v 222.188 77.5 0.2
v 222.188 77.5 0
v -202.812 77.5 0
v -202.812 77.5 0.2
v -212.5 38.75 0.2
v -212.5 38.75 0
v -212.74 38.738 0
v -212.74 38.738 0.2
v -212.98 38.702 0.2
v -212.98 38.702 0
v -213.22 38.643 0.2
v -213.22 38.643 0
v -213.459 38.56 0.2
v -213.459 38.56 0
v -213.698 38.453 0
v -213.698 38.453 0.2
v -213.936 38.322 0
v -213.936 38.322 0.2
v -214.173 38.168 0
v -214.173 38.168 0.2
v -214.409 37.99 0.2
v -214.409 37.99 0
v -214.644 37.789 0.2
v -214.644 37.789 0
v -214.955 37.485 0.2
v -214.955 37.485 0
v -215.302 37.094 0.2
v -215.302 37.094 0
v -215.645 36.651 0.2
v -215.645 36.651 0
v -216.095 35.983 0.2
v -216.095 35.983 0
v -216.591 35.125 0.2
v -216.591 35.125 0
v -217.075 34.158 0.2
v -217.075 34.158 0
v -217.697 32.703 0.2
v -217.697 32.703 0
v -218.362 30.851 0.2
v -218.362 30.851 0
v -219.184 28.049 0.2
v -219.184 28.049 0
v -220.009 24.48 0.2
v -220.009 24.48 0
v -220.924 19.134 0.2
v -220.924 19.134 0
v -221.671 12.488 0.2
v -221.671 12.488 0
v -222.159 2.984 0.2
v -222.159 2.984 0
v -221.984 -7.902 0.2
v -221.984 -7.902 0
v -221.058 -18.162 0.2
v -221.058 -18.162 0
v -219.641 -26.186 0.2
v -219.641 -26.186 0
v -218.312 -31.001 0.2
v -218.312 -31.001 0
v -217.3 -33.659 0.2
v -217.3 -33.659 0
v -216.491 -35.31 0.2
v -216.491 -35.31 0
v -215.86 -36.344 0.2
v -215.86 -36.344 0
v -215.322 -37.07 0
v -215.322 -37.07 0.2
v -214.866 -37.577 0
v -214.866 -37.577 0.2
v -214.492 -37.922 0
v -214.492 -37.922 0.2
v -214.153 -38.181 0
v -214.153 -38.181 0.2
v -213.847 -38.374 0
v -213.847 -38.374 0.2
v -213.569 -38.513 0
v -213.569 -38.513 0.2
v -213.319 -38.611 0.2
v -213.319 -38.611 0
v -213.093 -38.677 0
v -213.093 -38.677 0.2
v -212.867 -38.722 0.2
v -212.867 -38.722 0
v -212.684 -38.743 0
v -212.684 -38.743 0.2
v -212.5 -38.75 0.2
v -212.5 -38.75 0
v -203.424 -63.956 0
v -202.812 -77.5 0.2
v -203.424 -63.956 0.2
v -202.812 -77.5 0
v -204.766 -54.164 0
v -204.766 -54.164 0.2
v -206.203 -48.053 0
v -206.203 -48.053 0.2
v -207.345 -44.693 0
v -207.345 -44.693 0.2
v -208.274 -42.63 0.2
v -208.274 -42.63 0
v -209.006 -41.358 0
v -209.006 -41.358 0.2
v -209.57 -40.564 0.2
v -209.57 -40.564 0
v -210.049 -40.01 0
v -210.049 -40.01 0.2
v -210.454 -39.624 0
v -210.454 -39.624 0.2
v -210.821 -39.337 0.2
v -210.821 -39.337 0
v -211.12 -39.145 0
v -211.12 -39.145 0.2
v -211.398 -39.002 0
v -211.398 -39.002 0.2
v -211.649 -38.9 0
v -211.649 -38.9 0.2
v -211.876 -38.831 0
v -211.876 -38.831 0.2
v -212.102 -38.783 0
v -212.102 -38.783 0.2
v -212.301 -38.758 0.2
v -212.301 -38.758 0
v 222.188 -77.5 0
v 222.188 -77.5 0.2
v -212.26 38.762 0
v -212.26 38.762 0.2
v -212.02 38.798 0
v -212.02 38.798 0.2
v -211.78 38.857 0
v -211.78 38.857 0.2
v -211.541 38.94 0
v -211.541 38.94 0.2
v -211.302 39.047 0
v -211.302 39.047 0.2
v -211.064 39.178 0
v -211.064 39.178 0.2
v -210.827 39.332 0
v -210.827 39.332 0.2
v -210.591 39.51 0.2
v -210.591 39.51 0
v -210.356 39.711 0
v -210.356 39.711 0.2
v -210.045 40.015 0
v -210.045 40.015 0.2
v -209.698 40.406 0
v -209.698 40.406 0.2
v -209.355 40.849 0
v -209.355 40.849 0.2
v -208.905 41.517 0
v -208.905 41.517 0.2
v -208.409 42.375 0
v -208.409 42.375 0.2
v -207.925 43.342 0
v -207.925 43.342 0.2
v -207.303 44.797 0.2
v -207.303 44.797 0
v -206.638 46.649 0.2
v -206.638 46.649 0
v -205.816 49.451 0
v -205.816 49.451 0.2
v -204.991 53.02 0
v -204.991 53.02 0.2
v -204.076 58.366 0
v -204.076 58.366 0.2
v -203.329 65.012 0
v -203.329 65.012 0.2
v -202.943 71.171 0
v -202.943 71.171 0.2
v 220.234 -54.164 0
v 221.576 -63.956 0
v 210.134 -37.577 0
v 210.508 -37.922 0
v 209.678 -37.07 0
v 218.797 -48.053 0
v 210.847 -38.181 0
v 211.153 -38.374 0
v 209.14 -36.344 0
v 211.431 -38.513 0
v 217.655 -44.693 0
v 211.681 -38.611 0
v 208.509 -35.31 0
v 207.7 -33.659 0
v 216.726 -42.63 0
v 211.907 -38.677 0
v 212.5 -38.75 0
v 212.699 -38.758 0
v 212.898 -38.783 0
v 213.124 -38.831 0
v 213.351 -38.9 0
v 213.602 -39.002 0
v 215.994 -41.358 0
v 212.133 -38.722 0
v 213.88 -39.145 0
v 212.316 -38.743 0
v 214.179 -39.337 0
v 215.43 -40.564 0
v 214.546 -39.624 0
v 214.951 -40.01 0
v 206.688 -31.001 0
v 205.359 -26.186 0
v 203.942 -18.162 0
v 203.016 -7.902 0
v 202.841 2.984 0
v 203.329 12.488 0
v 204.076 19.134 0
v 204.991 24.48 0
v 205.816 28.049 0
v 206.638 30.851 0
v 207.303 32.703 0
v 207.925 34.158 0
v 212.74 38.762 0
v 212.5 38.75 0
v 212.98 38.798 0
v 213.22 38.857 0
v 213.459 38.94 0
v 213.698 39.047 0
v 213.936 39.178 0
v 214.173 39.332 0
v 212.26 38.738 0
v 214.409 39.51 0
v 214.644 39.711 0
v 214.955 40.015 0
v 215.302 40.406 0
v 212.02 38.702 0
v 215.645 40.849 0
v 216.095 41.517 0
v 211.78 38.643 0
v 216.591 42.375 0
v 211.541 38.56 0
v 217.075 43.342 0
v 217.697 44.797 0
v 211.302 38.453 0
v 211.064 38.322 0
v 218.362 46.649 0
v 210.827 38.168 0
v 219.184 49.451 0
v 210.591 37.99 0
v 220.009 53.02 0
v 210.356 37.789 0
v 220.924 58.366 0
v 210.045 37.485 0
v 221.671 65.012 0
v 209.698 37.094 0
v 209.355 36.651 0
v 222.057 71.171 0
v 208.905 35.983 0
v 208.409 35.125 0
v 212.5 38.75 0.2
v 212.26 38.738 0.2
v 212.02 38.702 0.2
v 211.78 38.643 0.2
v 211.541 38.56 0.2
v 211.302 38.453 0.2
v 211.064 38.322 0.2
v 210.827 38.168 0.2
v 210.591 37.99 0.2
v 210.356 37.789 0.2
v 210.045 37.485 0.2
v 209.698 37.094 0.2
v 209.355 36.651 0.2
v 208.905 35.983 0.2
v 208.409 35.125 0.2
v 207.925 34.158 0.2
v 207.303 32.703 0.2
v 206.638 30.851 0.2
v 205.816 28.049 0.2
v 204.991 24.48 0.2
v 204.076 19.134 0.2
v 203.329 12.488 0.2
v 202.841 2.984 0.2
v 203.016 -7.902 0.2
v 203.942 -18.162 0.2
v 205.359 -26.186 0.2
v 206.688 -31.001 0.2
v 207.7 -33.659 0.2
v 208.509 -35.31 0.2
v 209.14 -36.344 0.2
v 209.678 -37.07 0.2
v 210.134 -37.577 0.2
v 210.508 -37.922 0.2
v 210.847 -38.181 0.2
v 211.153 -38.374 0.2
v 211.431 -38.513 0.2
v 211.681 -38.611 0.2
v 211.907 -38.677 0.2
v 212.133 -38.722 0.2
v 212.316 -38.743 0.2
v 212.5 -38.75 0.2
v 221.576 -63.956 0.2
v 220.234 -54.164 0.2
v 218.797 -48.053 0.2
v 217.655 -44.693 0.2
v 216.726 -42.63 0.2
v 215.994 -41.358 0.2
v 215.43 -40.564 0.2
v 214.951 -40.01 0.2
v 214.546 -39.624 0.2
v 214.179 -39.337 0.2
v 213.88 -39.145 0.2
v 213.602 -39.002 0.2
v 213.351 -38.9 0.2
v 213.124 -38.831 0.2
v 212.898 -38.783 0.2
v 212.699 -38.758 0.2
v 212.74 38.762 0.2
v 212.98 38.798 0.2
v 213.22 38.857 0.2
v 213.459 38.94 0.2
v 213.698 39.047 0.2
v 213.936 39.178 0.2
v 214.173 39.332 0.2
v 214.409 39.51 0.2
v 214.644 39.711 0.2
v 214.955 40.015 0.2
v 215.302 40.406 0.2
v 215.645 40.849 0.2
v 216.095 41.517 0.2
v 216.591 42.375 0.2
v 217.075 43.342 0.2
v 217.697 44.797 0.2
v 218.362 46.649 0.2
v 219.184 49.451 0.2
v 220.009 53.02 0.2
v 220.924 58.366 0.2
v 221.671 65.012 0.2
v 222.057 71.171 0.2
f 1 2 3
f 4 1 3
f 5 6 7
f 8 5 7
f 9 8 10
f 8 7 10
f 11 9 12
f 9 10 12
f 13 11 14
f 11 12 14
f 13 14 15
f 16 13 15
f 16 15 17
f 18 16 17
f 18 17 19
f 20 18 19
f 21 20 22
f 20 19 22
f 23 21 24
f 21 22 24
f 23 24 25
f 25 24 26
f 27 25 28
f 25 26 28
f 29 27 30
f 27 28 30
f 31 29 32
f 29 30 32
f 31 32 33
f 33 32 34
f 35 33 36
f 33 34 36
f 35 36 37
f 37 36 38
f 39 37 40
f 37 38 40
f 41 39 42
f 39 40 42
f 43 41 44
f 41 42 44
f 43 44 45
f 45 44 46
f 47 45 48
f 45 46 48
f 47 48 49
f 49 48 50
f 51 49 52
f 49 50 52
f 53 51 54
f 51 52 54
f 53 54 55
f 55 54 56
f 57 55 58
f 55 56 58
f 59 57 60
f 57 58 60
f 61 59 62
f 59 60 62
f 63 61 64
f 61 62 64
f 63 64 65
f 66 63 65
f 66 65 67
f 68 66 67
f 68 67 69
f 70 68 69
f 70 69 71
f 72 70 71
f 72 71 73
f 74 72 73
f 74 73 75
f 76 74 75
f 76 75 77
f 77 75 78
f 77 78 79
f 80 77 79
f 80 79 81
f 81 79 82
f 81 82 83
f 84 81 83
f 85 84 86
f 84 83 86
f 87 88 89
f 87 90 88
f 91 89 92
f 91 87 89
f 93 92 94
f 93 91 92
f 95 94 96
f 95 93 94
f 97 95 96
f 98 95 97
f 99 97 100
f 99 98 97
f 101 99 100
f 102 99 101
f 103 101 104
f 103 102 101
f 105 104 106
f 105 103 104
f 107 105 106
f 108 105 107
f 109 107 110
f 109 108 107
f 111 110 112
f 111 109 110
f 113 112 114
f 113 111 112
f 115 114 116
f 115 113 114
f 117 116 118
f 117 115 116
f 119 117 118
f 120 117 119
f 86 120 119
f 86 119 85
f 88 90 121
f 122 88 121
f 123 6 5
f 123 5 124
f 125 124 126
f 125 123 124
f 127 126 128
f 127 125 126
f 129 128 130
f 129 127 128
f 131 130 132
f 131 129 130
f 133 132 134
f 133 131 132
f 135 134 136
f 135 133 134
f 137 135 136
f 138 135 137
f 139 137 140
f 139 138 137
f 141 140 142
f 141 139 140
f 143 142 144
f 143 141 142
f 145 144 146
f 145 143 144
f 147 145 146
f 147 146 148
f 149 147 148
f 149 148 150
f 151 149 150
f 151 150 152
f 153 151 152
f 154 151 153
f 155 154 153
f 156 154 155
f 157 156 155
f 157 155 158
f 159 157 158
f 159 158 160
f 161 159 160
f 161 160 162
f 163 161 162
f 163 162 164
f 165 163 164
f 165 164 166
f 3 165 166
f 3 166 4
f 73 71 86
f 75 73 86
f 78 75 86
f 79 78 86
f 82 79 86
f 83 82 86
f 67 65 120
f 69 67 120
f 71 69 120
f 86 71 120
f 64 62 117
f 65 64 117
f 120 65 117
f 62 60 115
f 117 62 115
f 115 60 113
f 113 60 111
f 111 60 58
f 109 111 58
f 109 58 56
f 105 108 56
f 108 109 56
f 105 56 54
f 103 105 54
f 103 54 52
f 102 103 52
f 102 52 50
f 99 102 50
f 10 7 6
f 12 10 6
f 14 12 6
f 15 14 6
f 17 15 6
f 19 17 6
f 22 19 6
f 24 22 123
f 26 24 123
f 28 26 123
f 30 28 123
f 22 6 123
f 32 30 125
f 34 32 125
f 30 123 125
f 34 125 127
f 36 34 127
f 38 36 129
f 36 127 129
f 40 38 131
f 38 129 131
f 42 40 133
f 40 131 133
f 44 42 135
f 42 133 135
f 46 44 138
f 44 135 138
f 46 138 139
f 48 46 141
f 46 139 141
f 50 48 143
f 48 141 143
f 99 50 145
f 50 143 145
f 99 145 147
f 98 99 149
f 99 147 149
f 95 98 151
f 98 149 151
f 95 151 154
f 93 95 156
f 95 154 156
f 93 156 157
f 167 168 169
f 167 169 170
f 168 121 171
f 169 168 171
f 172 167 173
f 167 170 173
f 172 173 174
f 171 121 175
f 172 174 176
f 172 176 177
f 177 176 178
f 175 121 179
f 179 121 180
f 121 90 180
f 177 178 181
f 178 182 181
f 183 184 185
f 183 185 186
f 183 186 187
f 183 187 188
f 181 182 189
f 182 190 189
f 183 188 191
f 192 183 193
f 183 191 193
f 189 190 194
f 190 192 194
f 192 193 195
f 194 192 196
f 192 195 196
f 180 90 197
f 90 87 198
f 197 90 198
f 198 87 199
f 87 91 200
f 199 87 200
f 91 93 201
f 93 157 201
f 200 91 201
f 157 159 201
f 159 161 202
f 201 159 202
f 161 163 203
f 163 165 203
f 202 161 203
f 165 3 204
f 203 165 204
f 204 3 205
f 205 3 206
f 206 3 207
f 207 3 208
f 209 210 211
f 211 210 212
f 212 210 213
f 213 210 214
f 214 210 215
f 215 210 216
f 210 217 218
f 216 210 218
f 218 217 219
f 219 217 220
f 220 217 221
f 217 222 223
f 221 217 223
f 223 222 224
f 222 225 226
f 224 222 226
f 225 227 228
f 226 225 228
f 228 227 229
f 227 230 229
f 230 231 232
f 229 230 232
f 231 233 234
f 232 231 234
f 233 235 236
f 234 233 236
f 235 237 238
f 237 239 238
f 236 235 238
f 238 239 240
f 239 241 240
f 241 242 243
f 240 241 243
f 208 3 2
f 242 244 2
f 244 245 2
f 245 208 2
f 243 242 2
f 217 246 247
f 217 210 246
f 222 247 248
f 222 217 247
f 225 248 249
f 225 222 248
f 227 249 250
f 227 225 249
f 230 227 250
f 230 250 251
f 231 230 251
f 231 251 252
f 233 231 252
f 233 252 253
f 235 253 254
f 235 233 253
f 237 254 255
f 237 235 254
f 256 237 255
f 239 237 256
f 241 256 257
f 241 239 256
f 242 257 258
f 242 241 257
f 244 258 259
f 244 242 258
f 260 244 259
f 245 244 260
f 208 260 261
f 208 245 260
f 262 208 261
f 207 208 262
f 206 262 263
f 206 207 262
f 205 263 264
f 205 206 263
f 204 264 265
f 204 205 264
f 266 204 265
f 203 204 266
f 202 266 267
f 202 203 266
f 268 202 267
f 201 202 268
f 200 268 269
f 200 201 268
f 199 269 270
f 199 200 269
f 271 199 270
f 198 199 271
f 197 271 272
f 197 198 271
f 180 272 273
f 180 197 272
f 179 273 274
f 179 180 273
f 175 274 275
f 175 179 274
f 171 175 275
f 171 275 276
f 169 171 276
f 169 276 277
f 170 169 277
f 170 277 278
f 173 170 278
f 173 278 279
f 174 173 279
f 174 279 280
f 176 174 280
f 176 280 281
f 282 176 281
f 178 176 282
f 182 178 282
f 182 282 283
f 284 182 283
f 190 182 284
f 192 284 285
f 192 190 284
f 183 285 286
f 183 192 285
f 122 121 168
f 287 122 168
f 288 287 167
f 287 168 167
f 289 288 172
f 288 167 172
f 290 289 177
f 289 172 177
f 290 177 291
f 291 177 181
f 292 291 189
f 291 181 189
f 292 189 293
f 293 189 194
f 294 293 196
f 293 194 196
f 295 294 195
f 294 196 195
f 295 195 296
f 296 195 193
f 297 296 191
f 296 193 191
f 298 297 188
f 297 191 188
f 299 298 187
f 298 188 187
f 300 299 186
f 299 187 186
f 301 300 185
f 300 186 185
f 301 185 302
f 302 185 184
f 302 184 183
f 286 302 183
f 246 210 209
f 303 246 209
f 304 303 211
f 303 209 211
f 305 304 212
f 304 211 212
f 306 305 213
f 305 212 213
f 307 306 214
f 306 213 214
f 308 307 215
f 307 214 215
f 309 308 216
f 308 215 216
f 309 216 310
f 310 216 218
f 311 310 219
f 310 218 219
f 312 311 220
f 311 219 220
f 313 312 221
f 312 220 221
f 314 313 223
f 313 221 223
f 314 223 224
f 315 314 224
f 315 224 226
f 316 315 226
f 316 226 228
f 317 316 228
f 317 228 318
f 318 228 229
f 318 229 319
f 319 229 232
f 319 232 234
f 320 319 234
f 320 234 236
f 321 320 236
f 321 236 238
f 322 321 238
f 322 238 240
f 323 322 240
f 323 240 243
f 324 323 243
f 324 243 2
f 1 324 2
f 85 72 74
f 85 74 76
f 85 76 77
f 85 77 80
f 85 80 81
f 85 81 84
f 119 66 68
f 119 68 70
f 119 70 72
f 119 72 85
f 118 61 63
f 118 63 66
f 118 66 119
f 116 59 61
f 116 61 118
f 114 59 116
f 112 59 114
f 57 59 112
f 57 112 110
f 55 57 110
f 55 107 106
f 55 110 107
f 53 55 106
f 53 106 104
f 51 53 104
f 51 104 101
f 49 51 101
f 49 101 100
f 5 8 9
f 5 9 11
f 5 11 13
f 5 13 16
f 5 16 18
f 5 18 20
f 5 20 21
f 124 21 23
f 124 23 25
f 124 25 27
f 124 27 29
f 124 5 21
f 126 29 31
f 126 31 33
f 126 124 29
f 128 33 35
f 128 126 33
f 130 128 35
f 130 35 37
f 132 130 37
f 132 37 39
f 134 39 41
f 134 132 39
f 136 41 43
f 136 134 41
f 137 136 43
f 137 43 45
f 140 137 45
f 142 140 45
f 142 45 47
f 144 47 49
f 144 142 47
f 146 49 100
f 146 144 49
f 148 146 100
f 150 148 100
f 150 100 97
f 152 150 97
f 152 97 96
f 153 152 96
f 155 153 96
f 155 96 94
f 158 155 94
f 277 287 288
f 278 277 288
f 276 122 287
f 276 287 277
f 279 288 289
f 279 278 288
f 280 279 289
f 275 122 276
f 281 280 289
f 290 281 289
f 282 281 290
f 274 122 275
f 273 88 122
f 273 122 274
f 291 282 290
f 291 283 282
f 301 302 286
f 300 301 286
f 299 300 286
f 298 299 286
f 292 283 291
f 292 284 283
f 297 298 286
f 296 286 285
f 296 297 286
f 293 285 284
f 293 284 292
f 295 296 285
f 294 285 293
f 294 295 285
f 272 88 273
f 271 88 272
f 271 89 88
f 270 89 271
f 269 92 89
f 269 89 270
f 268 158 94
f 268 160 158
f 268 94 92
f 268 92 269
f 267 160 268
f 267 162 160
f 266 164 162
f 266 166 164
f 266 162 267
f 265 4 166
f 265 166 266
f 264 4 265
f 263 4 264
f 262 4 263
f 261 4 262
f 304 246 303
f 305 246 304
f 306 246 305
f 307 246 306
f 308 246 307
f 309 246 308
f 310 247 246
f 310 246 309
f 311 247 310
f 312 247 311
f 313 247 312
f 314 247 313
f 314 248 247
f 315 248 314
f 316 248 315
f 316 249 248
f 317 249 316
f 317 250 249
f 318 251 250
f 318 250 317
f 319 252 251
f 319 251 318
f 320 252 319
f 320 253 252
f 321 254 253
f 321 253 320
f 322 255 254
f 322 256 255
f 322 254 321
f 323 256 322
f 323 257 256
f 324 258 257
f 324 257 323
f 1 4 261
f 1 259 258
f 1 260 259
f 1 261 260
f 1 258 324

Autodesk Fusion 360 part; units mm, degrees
sketch "Sketch1" plane through (0, 0, 0) normal (0, 0, 1) x (1, 0, 0)
  line L0 (212.5, 77.5) -> (-212.5, 77.5)
  line L1 (-212.5, 77.5) -> (-212.5, -77.5)
  line L2 (-212.5, -77.5) -> (212.5, -77.5)
  line L3 (212.5, -77.5) -> (212.5, 77.5)
  line L4 (212.5, 77.5) -> (-212.5, -77.5) construction
  line L5 (-212.5, 77.5) -> (212.5, -77.5) construction
  ellipse E0 centre (-212.5, 77.5) end of major axis (-212.5, 116.25) minor radius 9.6875
  line L6 (-212.5, 38.75) -> (-212.5, 116.25)
  line L7 (-202.8125, 77.5) -> (-222.1875, 77.5)
  ellipse E1 centre (212.5, 77.5) end of major axis (212.5, 116.25) minor radius 9.6875
  ellipse E2 centre (-212.5, 0) end of major axis (-212.5, 38.75) minor radius 9.6875
  ellipse E3 centre (212.5, 0) end of major axis (212.5, 38.75) minor radius 9.6875
  ellipse E4 centre (-212.5, -77.5) end of major axis (-212.5, -38.75) minor radius 9.6875
  ellipse E5 centre (212.5, -77.5) end of major axis (212.5, -38.75) minor radius 9.6875
  line L8 (212.5, -77.5) -> (250, -77.5)
  line L9 (212.5, 77.5) -> (250, 77.5)
  dimension "d3" = 425
  dimension "d4" = 155
  dimension "d5" = 77.5
  dimension "d6" = 19.375
  dimension "d9" = 425
extrude "Extrude1" add sketch "Sketch1" along normal blind 0.2 contours L0 L2 E0 E1 E2 E3 E4 E5 | L0 L3 E1 | L1 E2 | L1 E2 | L3 E1 L9 | L3 E5 L8 | L2 L3 E5
sketch "Sketch2" plane through (0, 0, 0.2) normal (0, 0, 1) x (1, 0, 0)
  line L0 (222.1875, 77.5) -> (-202.8125, 77.5)
  ellipse E0 centre (-212.5, 77.5) end of major axis (-212.5, 116.25) minor radius 9.6875 (-212.5, 38.75) -> (-202.8125, 77.5) ccw
  ellipse E1 centre (-212.5, 0) end of major axis (-212.5, 38.75) minor radius 9.6875 (-212.5, 38.75) -> (-212.5, -38.75) ccw
  ellipse E2 centre (-212.5, -77.5) end of major axis (-212.5, -38.75) minor radius 9.6875 (-202.8125, -77.5) -> (-212.5, -38.75) ccw
  line L1 (-202.8125, -77.5) -> (222.1875, -77.5)
  ellipse E3 centre (212.5, -77.5) end of major axis (212.5, -38.75) minor radius 9.6875 (222.1875, -77.5) -> (212.5, -38.75) ccw
  ellipse E4 centre (212.5, 0) end of major axis (212.5, 38.75) minor radius 9.6875 (212.5, 38.75) -> (212.5, -38.75) ccw
  ellipse E5 centre (212.5, 77.5) end of major axis (212.5, 116.25) minor radius 9.6875 (212.5, 38.75) -> (222.1875, 77.5) ccw
equation "belt_length = 425 mm"
equation "belt_width = 155 mm"
equation "d3 = belt_length"
equation "d4 = belt_width"
equation "d5 = belt_width / 2"
equation "d6 = belt_width / 8"
equation "d9 = belt_length"
equation "d10 = -belt_width"
